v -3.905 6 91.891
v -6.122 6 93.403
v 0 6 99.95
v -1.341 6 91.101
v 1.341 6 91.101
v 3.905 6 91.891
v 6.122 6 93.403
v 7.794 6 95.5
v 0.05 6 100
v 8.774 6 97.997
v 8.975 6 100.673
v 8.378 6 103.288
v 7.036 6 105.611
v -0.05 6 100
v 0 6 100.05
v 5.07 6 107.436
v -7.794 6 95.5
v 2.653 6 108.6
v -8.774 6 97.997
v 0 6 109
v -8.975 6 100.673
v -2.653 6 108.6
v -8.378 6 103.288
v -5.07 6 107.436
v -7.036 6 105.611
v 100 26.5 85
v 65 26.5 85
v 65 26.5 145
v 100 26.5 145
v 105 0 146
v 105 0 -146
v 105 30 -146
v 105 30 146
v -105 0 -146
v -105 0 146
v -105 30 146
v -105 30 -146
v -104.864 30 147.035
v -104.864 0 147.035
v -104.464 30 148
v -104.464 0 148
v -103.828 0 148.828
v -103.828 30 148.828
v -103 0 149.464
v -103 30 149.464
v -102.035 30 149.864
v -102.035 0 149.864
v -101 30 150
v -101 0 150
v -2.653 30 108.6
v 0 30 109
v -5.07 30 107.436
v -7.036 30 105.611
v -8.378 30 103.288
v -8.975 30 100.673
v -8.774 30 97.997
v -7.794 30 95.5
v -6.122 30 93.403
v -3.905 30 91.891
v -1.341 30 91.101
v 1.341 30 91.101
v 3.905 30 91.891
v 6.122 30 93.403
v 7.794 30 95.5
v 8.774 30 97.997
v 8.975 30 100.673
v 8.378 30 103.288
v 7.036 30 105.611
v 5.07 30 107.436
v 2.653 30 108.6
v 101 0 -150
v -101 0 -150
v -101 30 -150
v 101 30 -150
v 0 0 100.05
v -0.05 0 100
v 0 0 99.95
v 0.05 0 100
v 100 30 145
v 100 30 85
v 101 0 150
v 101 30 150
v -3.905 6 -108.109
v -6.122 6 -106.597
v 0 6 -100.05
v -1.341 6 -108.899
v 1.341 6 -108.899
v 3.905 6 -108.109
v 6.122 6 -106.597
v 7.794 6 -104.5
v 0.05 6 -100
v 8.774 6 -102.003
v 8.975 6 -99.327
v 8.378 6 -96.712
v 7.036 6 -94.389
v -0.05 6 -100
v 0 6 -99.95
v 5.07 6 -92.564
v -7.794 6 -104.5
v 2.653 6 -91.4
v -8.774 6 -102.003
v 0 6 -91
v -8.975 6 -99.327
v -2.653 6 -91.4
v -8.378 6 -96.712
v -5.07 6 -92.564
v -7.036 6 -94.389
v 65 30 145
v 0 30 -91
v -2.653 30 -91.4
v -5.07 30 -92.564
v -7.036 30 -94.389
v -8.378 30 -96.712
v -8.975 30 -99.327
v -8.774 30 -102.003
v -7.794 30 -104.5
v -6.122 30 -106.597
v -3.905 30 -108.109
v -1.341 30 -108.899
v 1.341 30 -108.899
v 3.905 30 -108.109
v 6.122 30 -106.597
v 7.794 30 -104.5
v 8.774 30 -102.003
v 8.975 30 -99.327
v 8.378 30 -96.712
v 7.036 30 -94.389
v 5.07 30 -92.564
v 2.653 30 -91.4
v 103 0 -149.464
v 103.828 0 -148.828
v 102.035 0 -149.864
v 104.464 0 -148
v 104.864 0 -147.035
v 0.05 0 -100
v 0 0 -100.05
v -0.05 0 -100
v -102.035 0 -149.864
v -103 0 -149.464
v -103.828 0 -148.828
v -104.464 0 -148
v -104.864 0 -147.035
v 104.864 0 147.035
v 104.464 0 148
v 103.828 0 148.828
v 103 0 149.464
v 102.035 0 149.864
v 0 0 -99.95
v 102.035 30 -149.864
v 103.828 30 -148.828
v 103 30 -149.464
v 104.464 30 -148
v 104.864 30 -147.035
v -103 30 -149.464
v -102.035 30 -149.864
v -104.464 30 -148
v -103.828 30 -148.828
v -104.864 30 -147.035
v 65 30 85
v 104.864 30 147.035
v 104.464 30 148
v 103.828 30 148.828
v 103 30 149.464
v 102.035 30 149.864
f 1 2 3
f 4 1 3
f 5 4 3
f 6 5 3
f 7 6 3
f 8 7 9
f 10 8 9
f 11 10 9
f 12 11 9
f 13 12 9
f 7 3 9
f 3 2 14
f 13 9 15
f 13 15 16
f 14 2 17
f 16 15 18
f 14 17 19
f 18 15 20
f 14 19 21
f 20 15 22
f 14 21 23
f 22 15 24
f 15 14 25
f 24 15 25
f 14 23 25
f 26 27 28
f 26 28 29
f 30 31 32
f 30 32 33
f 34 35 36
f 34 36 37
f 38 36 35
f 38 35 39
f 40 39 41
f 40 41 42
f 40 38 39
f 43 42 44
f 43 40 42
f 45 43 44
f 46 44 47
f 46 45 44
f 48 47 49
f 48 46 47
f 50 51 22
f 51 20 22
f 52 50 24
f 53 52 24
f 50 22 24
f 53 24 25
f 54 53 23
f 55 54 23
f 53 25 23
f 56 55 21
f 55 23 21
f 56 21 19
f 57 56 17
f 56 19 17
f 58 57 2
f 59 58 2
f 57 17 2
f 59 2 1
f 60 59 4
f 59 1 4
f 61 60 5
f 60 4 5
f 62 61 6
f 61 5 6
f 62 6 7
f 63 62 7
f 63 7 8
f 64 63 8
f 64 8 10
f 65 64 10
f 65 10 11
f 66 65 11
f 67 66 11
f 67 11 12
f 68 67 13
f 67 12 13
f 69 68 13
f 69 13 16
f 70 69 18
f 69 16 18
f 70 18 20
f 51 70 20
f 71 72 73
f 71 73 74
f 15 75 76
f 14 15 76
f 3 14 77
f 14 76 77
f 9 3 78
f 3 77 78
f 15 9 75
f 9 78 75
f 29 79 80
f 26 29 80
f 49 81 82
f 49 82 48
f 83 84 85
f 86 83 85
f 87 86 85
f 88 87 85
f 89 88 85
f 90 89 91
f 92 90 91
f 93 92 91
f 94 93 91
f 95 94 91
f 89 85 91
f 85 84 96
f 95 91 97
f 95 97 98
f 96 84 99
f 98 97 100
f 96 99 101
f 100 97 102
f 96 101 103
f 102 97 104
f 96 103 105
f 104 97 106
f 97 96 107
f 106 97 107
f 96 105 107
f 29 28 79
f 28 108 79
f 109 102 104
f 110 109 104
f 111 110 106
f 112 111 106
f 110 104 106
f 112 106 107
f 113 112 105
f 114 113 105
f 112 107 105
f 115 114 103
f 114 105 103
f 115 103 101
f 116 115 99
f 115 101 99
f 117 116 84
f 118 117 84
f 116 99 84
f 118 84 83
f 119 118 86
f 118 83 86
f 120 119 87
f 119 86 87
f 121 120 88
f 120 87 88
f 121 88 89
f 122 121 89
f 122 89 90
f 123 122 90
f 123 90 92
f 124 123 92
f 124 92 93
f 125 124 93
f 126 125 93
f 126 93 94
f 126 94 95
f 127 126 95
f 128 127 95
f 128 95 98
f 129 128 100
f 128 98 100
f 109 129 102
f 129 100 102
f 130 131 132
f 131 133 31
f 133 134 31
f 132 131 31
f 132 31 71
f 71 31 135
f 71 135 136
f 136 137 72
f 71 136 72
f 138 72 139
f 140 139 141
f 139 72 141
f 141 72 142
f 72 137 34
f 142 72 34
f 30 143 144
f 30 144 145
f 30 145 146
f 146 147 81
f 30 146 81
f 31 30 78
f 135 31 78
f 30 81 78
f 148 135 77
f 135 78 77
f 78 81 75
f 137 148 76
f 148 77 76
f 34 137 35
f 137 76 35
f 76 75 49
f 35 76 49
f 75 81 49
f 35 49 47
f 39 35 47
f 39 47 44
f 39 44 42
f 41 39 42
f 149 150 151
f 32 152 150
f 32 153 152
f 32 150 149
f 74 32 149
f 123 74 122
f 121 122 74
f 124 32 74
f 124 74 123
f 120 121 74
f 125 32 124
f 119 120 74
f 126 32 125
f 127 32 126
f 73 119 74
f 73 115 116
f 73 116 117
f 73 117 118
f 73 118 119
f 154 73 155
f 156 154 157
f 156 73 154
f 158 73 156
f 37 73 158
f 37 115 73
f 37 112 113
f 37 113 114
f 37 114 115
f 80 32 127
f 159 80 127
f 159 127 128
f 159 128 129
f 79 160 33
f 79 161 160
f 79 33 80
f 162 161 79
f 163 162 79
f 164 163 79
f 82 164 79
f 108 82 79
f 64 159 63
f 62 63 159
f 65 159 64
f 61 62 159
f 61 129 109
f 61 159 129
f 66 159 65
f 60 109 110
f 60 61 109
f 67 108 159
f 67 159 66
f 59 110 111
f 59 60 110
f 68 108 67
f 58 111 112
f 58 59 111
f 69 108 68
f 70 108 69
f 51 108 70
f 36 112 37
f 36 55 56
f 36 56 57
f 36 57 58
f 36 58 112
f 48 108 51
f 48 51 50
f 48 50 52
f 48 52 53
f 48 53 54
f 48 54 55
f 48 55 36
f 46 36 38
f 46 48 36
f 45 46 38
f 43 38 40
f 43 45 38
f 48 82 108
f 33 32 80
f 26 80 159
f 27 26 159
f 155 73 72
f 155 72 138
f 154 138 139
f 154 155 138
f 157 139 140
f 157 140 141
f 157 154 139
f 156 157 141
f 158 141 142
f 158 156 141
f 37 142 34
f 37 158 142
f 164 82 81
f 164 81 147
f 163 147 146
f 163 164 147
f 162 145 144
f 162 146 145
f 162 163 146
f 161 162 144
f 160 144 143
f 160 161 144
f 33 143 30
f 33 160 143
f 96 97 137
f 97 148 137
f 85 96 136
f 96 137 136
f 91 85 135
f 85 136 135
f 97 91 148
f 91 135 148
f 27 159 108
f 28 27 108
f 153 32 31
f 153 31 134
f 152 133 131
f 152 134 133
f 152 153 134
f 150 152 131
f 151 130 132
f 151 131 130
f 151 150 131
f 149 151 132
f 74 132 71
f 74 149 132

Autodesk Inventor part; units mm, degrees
ref_plane "YZ Plane" through (0, 0, 0) normal (1, 0, 0) x (0, 1, 0)
ref_plane "XZ Plane" through (0, 0, 0) normal (0, 1, 0) x (-1, 0, 0)
ref_plane "XY Plane" through (0, 0, 0) normal (0, 0, 1) x (1, 0, 0)
sketch "Sketch1" plane through (0, 0, 0) normal (0, 1, 0) x (-1, 0, 0)
  line L0 (105, -150) -> (-105, -150)
  line L1 (-105, -150) -> (-105, 150)
  line L2 (-105, 150) -> (105, 150)
  line L3 (105, 150) -> (105, -150)
  line L4 (105, -150) -> (-105, 150) construction
  line L5 (-105, -150) -> (105, 150) construction
  point P0 (0, 0)
  dimension "d0" = 210
  dimension "d1" = 300
extrude "Extrusion1" add sketch "Sketch1" along normal blind 30
sketch "Sketch2" plane through (0, 30, 0) normal (0, 1, 0) x (1, 0, 0)
  circle A0 centre (0, 100) radius 9
  circle A1 centre (0, -100) radius 9
  point P0 (0, 0)
  dimension "d4" = 18
  dimension "d5" = 18
  dimension "d6" = 100
  dimension "d7" = 100
hole "Hole1" at (0, 30, -100) at (0, 30, 100) direction (0, -1, 0) diameter 0.1 end through all counterbore diameter 18 counterbore depth 24
sketch "Sketch3" plane through (0, 30, 0) normal (0, 1, 0) x (1, 0, 0)
  line L0 (65, -145) -> (100, -145)
  line L1 (100, -145) -> (100, -85)
  line L2 (100, -85) -> (65, -85)
  line L3 (65, -85) -> (65, -145)
  line L4 (-105, -150) -> (105, -150) projected
  line L5 (105, -150) -> (105, 150) projected
  point P0 (0, 0)
  dimension "d15" = 35
  dimension "d16" = 60
  dimension "d17" = 5
  dimension "d19" = 5
extrude "Extrusion2" cut sketch "Sketch3" against normal blind 3.5
fillet "Fillet1" radius 4 4 edges at (105, 15, 150) (-105, 15, 150) (105, 15, -150) (-105, 15, -150)
properties part number "Podstawa"
